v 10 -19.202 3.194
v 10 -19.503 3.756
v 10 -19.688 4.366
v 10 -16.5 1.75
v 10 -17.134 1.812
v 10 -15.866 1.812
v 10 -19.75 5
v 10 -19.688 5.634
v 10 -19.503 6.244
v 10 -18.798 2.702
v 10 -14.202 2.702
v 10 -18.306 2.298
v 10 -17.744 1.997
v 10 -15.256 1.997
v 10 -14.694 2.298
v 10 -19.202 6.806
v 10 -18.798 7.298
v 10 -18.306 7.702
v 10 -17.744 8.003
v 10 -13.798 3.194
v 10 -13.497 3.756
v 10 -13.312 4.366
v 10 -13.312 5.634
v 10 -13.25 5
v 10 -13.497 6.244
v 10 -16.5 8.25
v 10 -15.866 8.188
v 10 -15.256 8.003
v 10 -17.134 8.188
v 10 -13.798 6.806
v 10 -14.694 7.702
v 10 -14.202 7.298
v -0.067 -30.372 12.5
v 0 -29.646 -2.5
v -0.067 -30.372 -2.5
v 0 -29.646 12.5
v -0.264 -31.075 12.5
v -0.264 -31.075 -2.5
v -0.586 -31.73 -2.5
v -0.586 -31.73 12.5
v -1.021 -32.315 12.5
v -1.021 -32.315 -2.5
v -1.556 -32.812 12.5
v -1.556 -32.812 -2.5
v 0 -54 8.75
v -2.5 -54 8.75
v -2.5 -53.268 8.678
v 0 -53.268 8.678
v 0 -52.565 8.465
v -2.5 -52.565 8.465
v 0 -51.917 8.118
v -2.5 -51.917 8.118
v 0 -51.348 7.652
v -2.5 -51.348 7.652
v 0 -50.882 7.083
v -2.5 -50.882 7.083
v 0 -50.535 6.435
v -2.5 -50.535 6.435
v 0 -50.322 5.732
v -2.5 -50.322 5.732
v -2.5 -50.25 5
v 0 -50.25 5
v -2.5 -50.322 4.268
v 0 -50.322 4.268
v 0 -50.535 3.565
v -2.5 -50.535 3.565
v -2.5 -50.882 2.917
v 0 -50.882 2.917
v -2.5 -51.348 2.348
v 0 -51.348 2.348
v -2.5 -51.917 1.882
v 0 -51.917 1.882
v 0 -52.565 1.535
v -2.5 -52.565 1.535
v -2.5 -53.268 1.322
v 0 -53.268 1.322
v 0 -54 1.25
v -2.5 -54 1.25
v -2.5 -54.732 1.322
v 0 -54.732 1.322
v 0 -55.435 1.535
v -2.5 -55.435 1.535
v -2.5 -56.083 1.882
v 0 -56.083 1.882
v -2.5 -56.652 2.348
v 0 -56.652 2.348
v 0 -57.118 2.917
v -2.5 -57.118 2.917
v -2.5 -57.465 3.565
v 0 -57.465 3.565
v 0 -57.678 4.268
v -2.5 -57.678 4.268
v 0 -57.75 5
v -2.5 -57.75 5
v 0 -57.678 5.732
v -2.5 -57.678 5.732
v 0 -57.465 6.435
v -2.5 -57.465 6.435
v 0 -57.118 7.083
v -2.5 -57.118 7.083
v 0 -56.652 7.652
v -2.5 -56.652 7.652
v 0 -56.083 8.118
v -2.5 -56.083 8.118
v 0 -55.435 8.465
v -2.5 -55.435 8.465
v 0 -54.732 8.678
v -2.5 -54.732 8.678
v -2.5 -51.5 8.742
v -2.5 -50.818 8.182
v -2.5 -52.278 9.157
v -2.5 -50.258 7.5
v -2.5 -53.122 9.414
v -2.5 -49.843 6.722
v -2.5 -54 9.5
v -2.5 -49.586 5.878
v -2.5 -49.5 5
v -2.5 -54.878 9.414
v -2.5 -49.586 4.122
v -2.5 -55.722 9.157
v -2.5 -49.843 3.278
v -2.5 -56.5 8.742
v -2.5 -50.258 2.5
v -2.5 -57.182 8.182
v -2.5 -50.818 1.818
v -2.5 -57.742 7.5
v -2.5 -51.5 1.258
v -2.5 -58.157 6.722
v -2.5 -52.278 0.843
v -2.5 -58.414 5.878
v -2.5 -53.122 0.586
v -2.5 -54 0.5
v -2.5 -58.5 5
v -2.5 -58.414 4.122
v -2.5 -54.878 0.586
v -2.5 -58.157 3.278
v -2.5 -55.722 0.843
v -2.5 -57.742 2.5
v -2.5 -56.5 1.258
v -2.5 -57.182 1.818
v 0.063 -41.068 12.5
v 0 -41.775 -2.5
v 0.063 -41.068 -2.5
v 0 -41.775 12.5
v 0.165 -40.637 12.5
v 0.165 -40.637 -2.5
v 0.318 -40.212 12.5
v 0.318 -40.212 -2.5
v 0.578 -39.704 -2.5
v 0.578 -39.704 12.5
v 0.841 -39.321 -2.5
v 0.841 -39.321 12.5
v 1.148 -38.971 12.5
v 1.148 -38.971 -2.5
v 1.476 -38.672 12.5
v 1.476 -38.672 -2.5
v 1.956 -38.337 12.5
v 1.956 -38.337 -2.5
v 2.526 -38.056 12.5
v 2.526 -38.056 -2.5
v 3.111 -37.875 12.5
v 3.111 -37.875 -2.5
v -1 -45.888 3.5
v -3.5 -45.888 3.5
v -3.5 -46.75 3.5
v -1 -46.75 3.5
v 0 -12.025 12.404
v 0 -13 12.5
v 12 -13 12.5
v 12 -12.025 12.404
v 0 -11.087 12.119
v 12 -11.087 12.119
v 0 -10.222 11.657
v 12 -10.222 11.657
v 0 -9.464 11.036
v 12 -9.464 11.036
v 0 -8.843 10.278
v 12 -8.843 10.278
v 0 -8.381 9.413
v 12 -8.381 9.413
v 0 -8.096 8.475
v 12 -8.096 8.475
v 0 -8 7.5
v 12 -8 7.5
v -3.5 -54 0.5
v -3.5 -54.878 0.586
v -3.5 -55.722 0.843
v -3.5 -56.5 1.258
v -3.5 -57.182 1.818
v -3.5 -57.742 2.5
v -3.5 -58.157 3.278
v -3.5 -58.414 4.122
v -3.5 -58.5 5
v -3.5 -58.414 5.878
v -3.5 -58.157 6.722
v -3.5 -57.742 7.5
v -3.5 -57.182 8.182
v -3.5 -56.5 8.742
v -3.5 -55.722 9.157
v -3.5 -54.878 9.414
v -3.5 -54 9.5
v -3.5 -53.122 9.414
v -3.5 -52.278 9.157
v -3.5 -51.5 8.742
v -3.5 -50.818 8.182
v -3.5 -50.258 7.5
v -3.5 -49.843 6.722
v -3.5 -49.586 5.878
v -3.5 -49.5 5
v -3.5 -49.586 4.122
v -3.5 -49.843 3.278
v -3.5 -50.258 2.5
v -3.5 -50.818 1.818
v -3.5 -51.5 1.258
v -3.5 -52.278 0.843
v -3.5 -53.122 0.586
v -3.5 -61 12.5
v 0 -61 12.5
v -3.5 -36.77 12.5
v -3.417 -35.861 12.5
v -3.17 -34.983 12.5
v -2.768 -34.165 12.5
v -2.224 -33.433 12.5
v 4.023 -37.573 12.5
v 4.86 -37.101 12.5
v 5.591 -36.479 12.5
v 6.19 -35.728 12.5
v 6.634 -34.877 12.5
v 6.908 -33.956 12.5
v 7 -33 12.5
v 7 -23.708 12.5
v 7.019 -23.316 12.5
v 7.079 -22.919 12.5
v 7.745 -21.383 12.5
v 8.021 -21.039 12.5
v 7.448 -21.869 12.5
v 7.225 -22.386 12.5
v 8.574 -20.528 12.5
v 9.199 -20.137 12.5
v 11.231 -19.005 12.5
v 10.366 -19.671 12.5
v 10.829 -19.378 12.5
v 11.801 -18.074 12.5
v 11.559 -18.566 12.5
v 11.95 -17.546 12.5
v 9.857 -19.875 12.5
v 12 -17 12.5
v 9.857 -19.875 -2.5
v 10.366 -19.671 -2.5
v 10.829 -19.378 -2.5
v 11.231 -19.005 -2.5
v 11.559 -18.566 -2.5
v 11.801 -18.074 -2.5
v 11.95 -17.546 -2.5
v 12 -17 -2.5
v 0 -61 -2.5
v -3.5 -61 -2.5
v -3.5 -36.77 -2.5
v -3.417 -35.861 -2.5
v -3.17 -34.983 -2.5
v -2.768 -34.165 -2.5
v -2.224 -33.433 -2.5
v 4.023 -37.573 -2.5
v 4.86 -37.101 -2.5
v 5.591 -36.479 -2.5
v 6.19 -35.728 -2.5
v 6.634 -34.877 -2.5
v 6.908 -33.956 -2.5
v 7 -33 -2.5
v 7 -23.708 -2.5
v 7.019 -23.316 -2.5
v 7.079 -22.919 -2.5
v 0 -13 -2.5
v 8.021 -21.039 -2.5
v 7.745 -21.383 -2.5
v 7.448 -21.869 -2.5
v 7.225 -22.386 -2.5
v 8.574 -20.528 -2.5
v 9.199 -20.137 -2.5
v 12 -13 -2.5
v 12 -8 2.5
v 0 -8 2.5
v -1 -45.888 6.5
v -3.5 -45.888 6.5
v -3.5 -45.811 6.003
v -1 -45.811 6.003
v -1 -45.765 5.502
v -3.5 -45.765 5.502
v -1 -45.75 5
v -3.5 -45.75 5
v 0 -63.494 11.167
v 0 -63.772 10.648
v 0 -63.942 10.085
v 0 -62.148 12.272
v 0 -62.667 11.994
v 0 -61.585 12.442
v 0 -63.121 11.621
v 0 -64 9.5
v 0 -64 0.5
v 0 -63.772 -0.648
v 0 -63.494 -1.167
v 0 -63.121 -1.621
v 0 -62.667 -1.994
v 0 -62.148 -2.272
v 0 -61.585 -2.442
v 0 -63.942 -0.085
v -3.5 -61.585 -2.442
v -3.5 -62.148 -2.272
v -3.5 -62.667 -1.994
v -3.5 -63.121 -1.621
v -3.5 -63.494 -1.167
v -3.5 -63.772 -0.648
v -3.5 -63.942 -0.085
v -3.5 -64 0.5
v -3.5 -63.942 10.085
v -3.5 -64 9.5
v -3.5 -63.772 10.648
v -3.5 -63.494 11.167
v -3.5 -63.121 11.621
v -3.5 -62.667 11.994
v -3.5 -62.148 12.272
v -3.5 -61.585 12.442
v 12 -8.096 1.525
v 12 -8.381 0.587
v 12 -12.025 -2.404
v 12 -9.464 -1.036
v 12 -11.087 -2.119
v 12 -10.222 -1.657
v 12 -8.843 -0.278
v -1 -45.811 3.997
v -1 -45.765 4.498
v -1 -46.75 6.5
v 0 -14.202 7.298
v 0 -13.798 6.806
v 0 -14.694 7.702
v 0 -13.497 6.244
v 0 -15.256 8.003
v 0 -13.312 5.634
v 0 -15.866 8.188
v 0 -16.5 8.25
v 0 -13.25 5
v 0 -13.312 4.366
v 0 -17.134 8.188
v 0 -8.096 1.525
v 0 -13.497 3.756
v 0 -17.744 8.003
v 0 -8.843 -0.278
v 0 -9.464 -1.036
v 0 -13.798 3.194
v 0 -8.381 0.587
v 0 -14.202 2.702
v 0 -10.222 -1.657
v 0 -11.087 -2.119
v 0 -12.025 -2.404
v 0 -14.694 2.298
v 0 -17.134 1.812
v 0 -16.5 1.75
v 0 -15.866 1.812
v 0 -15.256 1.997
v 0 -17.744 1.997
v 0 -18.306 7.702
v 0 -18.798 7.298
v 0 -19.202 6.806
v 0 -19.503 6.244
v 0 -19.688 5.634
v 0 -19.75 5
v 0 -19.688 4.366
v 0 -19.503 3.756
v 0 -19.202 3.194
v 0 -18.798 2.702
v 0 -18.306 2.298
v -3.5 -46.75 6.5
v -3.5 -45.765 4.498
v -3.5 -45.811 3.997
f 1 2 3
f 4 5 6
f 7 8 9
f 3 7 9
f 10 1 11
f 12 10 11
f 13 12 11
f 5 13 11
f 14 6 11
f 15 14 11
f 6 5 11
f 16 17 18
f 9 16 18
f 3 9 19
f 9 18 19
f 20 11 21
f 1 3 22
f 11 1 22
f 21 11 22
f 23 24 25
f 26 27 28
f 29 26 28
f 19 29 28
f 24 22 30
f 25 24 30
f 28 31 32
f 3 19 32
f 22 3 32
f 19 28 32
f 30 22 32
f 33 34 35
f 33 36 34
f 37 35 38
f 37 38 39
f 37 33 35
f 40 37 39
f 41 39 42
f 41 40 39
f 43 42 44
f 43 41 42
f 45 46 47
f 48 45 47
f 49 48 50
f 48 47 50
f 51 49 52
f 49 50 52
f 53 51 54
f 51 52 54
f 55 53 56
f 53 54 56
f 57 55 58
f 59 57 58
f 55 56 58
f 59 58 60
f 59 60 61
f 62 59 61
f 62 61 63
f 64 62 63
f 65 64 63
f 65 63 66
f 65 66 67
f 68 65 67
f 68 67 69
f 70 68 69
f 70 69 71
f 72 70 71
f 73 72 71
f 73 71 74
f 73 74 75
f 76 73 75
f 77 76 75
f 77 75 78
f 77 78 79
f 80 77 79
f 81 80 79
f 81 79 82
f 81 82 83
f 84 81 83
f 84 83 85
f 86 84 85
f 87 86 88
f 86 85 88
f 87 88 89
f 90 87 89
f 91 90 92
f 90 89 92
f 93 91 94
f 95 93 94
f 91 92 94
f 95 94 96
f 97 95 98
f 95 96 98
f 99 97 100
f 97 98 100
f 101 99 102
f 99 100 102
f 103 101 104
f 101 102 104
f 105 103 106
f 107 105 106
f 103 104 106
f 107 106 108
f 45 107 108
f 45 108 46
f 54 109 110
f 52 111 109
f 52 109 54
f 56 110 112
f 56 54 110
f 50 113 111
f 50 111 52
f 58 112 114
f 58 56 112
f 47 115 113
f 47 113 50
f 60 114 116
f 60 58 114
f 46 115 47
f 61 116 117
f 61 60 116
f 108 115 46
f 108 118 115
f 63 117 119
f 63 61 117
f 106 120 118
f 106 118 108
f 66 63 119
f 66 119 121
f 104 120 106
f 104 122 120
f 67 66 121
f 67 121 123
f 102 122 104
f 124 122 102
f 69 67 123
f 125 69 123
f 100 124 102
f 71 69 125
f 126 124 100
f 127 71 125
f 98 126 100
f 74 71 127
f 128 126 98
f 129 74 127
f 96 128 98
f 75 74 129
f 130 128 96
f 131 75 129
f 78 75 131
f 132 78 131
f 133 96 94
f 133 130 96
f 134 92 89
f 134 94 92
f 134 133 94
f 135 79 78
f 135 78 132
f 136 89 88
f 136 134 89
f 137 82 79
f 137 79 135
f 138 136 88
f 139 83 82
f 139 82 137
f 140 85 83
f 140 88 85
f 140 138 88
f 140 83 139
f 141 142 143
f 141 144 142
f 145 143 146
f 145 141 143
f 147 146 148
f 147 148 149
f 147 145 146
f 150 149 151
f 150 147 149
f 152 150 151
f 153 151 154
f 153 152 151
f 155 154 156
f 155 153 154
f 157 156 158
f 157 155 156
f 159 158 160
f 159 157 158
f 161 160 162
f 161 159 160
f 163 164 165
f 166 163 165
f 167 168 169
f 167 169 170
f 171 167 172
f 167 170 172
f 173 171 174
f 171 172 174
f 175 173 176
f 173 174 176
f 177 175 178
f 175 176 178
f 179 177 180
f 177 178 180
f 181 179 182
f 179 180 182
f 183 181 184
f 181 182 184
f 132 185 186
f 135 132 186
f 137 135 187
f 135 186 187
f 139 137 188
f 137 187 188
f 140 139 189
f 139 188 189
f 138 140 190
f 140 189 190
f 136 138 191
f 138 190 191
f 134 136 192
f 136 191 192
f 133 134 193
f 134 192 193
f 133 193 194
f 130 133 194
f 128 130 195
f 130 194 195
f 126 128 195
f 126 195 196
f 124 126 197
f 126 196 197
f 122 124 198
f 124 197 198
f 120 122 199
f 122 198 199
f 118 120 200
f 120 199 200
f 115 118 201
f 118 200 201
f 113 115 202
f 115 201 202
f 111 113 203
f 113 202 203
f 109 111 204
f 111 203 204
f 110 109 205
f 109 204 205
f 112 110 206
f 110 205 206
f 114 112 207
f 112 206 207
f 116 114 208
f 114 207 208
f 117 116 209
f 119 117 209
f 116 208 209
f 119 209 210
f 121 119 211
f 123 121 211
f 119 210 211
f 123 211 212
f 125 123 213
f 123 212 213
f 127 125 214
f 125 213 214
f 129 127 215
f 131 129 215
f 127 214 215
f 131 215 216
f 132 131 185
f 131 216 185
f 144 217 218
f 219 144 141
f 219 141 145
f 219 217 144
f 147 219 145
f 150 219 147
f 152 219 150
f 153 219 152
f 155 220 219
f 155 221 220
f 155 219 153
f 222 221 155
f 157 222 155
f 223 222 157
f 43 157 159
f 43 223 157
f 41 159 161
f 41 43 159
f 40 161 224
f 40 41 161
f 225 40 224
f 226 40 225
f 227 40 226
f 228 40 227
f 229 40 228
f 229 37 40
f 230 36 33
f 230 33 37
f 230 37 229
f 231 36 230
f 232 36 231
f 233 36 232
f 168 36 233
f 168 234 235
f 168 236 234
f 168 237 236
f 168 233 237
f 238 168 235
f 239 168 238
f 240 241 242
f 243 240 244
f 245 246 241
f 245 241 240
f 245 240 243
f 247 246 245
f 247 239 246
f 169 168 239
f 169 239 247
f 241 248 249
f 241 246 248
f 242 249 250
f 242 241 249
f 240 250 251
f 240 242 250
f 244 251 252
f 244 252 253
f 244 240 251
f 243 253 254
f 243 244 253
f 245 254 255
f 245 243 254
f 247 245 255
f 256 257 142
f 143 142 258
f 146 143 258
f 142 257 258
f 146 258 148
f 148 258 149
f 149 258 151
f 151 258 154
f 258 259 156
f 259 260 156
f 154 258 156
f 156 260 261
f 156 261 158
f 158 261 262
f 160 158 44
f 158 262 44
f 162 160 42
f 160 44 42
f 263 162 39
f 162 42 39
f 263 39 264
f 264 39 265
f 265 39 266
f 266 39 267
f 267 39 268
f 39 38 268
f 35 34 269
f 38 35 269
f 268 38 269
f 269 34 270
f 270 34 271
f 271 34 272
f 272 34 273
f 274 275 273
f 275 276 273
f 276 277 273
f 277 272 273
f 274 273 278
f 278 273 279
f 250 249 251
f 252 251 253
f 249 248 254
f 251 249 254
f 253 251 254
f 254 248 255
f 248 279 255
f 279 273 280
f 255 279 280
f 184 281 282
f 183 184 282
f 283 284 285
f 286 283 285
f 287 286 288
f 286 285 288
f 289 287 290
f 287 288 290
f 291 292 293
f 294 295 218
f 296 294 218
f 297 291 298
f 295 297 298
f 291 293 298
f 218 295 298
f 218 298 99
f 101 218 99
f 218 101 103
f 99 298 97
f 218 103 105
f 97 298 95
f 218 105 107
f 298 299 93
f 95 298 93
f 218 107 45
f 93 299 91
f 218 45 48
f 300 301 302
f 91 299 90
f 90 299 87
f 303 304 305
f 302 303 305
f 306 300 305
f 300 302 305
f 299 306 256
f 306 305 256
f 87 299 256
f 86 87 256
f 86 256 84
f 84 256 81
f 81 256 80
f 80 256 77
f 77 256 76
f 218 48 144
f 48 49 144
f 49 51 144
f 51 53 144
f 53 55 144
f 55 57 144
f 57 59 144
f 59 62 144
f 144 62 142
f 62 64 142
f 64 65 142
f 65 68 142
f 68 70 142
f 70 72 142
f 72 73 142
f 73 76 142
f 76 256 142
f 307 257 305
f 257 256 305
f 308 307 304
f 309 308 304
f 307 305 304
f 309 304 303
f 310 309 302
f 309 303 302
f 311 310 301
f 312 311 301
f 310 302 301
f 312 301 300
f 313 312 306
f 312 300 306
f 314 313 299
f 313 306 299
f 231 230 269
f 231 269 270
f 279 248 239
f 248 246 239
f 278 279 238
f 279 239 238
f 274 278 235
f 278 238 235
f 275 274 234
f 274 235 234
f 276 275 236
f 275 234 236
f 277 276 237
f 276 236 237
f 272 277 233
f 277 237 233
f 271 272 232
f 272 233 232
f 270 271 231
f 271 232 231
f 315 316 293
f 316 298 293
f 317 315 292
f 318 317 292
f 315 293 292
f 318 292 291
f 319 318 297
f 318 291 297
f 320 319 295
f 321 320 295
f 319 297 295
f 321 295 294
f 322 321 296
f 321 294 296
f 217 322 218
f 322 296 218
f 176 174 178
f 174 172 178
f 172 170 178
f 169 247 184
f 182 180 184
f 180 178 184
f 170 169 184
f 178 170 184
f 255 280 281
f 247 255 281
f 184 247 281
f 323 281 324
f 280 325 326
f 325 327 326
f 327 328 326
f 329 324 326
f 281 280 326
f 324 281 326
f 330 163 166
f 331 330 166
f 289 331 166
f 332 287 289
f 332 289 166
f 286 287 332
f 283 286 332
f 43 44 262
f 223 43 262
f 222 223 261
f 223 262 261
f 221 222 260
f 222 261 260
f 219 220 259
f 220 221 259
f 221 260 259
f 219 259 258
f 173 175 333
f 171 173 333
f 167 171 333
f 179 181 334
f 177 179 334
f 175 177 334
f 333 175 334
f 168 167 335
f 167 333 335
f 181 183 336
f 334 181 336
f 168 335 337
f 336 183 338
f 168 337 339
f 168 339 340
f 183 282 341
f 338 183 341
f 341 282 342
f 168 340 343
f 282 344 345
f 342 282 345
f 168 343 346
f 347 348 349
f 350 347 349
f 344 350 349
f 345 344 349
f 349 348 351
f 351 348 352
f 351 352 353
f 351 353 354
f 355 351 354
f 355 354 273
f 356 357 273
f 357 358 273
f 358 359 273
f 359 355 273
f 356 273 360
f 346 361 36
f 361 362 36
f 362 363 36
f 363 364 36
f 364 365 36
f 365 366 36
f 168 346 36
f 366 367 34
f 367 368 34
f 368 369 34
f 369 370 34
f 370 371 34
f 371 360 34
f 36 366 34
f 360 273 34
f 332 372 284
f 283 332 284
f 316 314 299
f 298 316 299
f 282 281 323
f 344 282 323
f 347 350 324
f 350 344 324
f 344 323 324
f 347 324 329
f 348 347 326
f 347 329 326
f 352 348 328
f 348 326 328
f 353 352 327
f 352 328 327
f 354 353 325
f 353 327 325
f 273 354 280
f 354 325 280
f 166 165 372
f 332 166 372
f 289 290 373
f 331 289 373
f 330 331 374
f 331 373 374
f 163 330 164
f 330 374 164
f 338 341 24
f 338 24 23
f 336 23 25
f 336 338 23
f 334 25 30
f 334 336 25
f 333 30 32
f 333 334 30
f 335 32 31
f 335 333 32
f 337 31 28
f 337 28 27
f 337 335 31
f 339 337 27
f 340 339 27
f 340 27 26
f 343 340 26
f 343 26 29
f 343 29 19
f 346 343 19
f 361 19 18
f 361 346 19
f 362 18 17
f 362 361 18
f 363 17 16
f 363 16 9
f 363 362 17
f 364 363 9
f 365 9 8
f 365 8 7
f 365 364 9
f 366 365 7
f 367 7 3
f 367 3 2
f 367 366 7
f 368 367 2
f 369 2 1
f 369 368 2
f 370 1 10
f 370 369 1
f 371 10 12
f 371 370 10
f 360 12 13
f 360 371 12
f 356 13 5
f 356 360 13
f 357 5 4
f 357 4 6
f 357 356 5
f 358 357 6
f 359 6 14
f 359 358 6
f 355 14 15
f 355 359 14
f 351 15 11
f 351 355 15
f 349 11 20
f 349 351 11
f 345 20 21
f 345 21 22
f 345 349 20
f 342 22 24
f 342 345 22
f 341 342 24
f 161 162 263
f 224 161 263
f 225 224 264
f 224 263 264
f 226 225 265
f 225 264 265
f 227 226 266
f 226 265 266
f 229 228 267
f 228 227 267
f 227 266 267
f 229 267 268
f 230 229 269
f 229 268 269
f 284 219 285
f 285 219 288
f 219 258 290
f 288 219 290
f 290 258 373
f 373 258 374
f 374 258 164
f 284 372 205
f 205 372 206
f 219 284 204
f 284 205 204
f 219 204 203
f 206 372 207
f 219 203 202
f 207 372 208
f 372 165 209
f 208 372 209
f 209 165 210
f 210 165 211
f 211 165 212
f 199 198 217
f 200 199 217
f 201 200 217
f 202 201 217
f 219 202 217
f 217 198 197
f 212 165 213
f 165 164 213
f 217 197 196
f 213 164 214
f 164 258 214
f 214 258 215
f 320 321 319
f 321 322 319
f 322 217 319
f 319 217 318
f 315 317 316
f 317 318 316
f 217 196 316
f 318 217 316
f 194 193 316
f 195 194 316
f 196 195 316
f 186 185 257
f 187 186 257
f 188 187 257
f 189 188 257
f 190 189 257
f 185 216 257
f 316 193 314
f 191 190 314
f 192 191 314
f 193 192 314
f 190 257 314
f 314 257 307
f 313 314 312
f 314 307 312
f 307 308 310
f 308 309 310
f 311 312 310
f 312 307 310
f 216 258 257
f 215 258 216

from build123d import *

# Parameters (mm, degrees)
BOSS_EXTRUDE1_DEPTH      = 12.5
BOSS_EXTRUDE1_DEPTH_BACK = 2.5
F_3DSKETCH2_R            = 4.5
CUT_EXTRUDE2_DEPTH       = 1
CUT_EXTRUDE3_REACH       = 68.802
SKETCH3_R                = 3.75
CUT_EXTRUDE6_OUTLINE_R   = 3.25
CUT_EXTRUDE6_DEPTH       = 10
CUT_EXTRUDE7_DEPTH       = 2.5
FILLET1_R                = 5
FILLET2_R                = 4
FILLET3_R                = 4
FILLET4_R                = 3
FILLET5_R                = 3
FILLET6_R                = 4


# Read off the part's stored shape, not the designer's step: Cut-Extrude6
with BuildPart() as part:
    # Sketch1 → Boss-Extrude1 (new, two sides: drawn at the far end of the back side and taken through both)
    with BuildSketch(Plane.XY.offset(-BOSS_EXTRUDE1_DEPTH_BACK)):
        Polygon((0, -8), (0, -32), (-3.5, -32), (-3.5, -64), (0, -64), (0, -38), (7, -38), (7, -20), (12, -20), (12, -8), align=None)
    extrude(amount=BOSS_EXTRUDE1_DEPTH + BOSS_EXTRUDE1_DEPTH_BACK)

    # 3DSketch2 → Cut-Extrude2 (cut)
    with BuildSketch(Plane(origin=(-3.5, -54, 5), x_dir=(0, -1, 0), z_dir=(-1, 0, 0))):
        with Locations(Location((0, 0, 0), (0, 0, 270))):
            Circle(F_3DSKETCH2_R)
    extrude(amount=-CUT_EXTRUDE2_DEPTH, mode=Mode.SUBTRACT)

    # Sketch3 → Cut-Extrude3 (cut, up to next)
    with BuildSketch(Plane.ZY.offset(2.5), mode=Mode.PRIVATE) as cut_extrude3_sk1:
        with Locations((5, -54)):
            Circle(SKETCH3_R)
    cut_extrude3_tool1 = extrude(cut_extrude3_sk1.sketch, amount=-CUT_EXTRUDE3_REACH, mode=Mode.PRIVATE) & part.part
    add(cut_extrude3_tool1.solids().sort_by_distance((-2.5, -54, 5))[0], mode=Mode.SUBTRACT)

    # Cut-Extrude6 outline → Cut-Extrude6 (cut)
    with BuildSketch(Plane.YZ):
        with Locations((-16.5, 5)):
            Circle(CUT_EXTRUDE6_OUTLINE_R)
    extrude(amount=CUT_EXTRUDE6_DEPTH, mode=Mode.SUBTRACT)

    # Sketch4 → Cut-Extrude7 (cut)
    with BuildSketch(Plane.ZY.offset(3.5)):
        with BuildLine():
            Line((5, -46.75), (5, -45.75))
            ThreePointArc((5, -45.75), (4.24685511, -45.784449332), (3.5, -45.88750963))
            Line((3.5, -45.88750963), (3.5, -46.75))
            Line((3.5, -46.75), (5, -46.75))
        make_face()
        with BuildLine():
            ThreePointArc((6.5, -45.88750963), (5.75314489, -45.784449332), (5, -45.75))
            Line((5, -45.75), (5, -46.75))
            Line((5, -46.75), (6.5, -46.75))
            Line((6.5, -46.75), (6.5, -45.88750963))
        make_face()
    extrude(amount=-CUT_EXTRUDE7_DEPTH, mode=Mode.SUBTRACT)

    # Fillet1
    # the kernel refuses this fillet: 5 mm, written as the material it takes off along each edge
    with BuildSketch(Plane(origin=(7, -38, -15), x_dir=(-1, 0, 0), z_dir=(0, 0, 1))) as fillet1_piece_1:
        with BuildLine():
            CenterArc((FILLET1_R, -FILLET1_R), FILLET1_R, 90, 90)
            Line((0, -FILLET1_R), (-FILLET1_R * 0.02, -FILLET1_R))
            Line((-FILLET1_R * 0.02, -FILLET1_R), (-FILLET1_R * 0.02, FILLET1_R * 0.02))
            Line((-FILLET1_R * 0.02, FILLET1_R * 0.02), (FILLET1_R, FILLET1_R * 0.02))
            Line((FILLET1_R, FILLET1_R * 0.02), (FILLET1_R, 0))
        make_face()
    extrude(amount=40, mode=Mode.SUBTRACT)
    with BuildSketch(Plane(origin=(24.5, -8, 12.5), x_dir=(0, 0, -1), z_dir=(-1, 0, 0))) as fillet1_piece_2:
        with BuildLine():
            CenterArc((FILLET1_R, FILLET1_R), FILLET1_R, 180, 90)
            Line((0, FILLET1_R), (-FILLET1_R * 0.02, FILLET1_R))
            Line((-FILLET1_R * 0.02, FILLET1_R), (-FILLET1_R * 0.02, -FILLET1_R * 0.02))
            Line((-FILLET1_R * 0.02, -FILLET1_R * 0.02), (FILLET1_R, -FILLET1_R * 0.02))
            Line((FILLET1_R, -FILLET1_R * 0.02), (FILLET1_R, 0))
        make_face()
    extrude(amount=37, mode=Mode.SUBTRACT)
    with BuildSketch(Plane(origin=(24.5, -8, -2.5), x_dir=(0, 0, 1), z_dir=(-1, 0, 0))) as fillet1_piece_3:
        with BuildLine():
            CenterArc((FILLET1_R, -FILLET1_R), FILLET1_R, 90, 90)
            Line((0, -FILLET1_R), (-FILLET1_R * 0.02, -FILLET1_R))
            Line((-FILLET1_R * 0.02, -FILLET1_R), (-FILLET1_R * 0.02, FILLET1_R * 0.02))
            Line((-FILLET1_R * 0.02, FILLET1_R * 0.02), (FILLET1_R, FILLET1_R * 0.02))
            Line((FILLET1_R, FILLET1_R * 0.02), (FILLET1_R, 0))
        make_face()
    extrude(amount=37, mode=Mode.SUBTRACT)
    with BuildSketch(Plane(origin=(-3.5, -32, -14.424240018), x_dir=(1, 0, 0), z_dir=(0, 0, 1))) as fillet1_piece_4:
        with BuildLine():
            CenterArc((5, -4.769696007), FILLET1_R, 107.457603124, 72.542396876)
            Line((0, -4.769696007), (-0.1, -4.769696007))
            Line((-0.1, -4.769696007), (-0.1, 0))
            Line((-0.1, 0), (0, 0.1))
            ThreePointArc((0, 0.1), (1.75, 0.1), (3.47, 0.09539392))
            Line((3.47, 0.09539392), (3.5, 0))
        make_face()
    extrude(amount=38.848480035, mode=Mode.SUBTRACT)

    # Fillet2
    fillet2_edges = [part.edges().sort_by_distance(p)[0] for p in [
        (0, -32, 5),
    ]]
    fillet(fillet2_edges, radius=FILLET2_R)

    # Fillet3
    fillet3_edges = [part.edges().sort_by_distance(p)[0] for p in [
        (0, -38, 5),
    ]]
    fillet(fillet3_edges, radius=FILLET3_R)

    # Fillet4
    fillet4_edges = [part.edges().sort_by_distance(p)[0] for p in [
        (-1.75, -64, 12.5),
        (-1.75, -64, -2.5),
    ]]
    fillet(fillet4_edges, radius=FILLET4_R)

    # Fillet5
    fillet5_edges = [part.edges().sort_by_distance(p)[0] for p in [
        (12, -20, 5),
    ]]
    fillet(fillet5_edges, radius=FILLET5_R)

    # Fillet6
    fillet6_edges = [part.edges().sort_by_distance(p)[0] for p in [
        (7, -20, 5),
    ]]
    fillet(fillet6_edges, radius=FILLET6_R)


solid = part.part
